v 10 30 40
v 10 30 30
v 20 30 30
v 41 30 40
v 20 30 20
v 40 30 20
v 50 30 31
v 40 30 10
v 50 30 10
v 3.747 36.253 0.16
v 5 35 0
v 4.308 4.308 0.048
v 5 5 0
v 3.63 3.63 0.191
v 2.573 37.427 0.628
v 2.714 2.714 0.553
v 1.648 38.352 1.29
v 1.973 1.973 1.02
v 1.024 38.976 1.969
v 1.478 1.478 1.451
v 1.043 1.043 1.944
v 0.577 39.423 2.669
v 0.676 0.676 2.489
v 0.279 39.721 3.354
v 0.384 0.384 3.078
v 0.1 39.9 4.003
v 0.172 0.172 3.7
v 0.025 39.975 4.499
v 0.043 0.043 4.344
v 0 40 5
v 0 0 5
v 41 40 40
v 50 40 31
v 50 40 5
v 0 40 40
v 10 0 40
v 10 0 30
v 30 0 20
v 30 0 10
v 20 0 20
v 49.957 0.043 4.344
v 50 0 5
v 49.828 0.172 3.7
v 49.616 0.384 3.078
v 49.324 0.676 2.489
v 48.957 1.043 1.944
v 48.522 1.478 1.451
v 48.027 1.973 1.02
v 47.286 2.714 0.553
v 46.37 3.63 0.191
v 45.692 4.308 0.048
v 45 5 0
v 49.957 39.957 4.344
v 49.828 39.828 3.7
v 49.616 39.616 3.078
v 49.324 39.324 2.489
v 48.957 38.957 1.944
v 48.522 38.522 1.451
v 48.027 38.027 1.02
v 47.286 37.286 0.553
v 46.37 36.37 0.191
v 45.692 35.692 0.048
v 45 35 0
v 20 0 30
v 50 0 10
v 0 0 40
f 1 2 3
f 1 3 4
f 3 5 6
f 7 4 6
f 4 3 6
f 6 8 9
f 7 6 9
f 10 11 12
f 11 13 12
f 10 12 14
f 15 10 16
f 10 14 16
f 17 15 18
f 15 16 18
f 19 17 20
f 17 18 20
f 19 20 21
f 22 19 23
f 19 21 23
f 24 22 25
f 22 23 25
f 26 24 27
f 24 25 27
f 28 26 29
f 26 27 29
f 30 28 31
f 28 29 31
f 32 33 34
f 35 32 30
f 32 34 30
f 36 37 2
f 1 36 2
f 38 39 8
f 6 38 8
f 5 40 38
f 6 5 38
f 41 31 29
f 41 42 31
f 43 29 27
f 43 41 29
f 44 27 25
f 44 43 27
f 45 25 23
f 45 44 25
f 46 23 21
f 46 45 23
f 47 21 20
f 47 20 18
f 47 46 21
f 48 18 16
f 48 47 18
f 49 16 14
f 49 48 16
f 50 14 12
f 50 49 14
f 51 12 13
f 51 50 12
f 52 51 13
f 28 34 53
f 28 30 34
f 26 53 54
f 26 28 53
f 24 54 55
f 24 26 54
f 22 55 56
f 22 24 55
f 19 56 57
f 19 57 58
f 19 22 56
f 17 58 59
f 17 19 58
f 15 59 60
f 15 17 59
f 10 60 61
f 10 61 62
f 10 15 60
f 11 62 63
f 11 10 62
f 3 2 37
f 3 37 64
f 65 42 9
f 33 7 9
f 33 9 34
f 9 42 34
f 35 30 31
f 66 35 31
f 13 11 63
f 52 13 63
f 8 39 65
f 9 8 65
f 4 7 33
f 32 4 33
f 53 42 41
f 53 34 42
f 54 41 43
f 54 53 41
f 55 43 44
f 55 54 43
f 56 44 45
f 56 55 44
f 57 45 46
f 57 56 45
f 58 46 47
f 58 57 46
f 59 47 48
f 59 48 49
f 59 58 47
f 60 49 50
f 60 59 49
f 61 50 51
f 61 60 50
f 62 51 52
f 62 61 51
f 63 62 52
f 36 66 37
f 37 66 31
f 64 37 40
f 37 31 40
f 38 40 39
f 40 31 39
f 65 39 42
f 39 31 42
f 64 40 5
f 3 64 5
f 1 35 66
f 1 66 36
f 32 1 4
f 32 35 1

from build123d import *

# Parameters (mm, degrees)
F1_DEPTH = 40
F0_W     = 10
F0_H     = 30
F2_DEPTH = 30
F3_DEPTH = 20
F4_DEPTH = 10
F5_SIZE  = 9
F6_R     = 5


with BuildPart() as f1:
    # F0 (on Top) → F1 (new body)
    with BuildSketch(Plane.XY):
        Polygon((0, 40), (0, 0), (10, 0), (10, 30), (20, 30), (40, 30), (50, 30), (50, 40), align=None)
    extrude(amount=F1_DEPTH)

    # F0 (on Top) → F2 (join)
    with BuildSketch(Plane.XY):
        with Locations((15, 15)):
            Rectangle(F0_W, F0_H)
    extrude(amount=F2_DEPTH)

    # F0 (on Top) → F3 (join)
    with BuildSketch(Plane.XY):
        Polygon((20, 30), (20, 0), (30, 0), (40, 30), align=None)
    extrude(amount=F3_DEPTH)

    # F0 (on Top) → F4 (join)
    with BuildSketch(Plane.XY):
        Polygon((40, 30), (30, 0), (50, 0), (50, 30), align=None)
    extrude(amount=F4_DEPTH)

    # F5
    f5_edges = [f1.edges().sort_by_distance(p)[0] for p in [
        (50, 35, 40),
    ]]
    chamfer(f5_edges, length=F5_SIZE)

    # F6
    f6_edges = [f1.edges().sort_by_distance(p)[0] for p in [
        (50, 20, 0),
        (25, 0, 0),
        (0, 20, 0),
        (25, 40, 0),
    ]]
    fillet(f6_edges, radius=F6_R)


solid = f1.part
